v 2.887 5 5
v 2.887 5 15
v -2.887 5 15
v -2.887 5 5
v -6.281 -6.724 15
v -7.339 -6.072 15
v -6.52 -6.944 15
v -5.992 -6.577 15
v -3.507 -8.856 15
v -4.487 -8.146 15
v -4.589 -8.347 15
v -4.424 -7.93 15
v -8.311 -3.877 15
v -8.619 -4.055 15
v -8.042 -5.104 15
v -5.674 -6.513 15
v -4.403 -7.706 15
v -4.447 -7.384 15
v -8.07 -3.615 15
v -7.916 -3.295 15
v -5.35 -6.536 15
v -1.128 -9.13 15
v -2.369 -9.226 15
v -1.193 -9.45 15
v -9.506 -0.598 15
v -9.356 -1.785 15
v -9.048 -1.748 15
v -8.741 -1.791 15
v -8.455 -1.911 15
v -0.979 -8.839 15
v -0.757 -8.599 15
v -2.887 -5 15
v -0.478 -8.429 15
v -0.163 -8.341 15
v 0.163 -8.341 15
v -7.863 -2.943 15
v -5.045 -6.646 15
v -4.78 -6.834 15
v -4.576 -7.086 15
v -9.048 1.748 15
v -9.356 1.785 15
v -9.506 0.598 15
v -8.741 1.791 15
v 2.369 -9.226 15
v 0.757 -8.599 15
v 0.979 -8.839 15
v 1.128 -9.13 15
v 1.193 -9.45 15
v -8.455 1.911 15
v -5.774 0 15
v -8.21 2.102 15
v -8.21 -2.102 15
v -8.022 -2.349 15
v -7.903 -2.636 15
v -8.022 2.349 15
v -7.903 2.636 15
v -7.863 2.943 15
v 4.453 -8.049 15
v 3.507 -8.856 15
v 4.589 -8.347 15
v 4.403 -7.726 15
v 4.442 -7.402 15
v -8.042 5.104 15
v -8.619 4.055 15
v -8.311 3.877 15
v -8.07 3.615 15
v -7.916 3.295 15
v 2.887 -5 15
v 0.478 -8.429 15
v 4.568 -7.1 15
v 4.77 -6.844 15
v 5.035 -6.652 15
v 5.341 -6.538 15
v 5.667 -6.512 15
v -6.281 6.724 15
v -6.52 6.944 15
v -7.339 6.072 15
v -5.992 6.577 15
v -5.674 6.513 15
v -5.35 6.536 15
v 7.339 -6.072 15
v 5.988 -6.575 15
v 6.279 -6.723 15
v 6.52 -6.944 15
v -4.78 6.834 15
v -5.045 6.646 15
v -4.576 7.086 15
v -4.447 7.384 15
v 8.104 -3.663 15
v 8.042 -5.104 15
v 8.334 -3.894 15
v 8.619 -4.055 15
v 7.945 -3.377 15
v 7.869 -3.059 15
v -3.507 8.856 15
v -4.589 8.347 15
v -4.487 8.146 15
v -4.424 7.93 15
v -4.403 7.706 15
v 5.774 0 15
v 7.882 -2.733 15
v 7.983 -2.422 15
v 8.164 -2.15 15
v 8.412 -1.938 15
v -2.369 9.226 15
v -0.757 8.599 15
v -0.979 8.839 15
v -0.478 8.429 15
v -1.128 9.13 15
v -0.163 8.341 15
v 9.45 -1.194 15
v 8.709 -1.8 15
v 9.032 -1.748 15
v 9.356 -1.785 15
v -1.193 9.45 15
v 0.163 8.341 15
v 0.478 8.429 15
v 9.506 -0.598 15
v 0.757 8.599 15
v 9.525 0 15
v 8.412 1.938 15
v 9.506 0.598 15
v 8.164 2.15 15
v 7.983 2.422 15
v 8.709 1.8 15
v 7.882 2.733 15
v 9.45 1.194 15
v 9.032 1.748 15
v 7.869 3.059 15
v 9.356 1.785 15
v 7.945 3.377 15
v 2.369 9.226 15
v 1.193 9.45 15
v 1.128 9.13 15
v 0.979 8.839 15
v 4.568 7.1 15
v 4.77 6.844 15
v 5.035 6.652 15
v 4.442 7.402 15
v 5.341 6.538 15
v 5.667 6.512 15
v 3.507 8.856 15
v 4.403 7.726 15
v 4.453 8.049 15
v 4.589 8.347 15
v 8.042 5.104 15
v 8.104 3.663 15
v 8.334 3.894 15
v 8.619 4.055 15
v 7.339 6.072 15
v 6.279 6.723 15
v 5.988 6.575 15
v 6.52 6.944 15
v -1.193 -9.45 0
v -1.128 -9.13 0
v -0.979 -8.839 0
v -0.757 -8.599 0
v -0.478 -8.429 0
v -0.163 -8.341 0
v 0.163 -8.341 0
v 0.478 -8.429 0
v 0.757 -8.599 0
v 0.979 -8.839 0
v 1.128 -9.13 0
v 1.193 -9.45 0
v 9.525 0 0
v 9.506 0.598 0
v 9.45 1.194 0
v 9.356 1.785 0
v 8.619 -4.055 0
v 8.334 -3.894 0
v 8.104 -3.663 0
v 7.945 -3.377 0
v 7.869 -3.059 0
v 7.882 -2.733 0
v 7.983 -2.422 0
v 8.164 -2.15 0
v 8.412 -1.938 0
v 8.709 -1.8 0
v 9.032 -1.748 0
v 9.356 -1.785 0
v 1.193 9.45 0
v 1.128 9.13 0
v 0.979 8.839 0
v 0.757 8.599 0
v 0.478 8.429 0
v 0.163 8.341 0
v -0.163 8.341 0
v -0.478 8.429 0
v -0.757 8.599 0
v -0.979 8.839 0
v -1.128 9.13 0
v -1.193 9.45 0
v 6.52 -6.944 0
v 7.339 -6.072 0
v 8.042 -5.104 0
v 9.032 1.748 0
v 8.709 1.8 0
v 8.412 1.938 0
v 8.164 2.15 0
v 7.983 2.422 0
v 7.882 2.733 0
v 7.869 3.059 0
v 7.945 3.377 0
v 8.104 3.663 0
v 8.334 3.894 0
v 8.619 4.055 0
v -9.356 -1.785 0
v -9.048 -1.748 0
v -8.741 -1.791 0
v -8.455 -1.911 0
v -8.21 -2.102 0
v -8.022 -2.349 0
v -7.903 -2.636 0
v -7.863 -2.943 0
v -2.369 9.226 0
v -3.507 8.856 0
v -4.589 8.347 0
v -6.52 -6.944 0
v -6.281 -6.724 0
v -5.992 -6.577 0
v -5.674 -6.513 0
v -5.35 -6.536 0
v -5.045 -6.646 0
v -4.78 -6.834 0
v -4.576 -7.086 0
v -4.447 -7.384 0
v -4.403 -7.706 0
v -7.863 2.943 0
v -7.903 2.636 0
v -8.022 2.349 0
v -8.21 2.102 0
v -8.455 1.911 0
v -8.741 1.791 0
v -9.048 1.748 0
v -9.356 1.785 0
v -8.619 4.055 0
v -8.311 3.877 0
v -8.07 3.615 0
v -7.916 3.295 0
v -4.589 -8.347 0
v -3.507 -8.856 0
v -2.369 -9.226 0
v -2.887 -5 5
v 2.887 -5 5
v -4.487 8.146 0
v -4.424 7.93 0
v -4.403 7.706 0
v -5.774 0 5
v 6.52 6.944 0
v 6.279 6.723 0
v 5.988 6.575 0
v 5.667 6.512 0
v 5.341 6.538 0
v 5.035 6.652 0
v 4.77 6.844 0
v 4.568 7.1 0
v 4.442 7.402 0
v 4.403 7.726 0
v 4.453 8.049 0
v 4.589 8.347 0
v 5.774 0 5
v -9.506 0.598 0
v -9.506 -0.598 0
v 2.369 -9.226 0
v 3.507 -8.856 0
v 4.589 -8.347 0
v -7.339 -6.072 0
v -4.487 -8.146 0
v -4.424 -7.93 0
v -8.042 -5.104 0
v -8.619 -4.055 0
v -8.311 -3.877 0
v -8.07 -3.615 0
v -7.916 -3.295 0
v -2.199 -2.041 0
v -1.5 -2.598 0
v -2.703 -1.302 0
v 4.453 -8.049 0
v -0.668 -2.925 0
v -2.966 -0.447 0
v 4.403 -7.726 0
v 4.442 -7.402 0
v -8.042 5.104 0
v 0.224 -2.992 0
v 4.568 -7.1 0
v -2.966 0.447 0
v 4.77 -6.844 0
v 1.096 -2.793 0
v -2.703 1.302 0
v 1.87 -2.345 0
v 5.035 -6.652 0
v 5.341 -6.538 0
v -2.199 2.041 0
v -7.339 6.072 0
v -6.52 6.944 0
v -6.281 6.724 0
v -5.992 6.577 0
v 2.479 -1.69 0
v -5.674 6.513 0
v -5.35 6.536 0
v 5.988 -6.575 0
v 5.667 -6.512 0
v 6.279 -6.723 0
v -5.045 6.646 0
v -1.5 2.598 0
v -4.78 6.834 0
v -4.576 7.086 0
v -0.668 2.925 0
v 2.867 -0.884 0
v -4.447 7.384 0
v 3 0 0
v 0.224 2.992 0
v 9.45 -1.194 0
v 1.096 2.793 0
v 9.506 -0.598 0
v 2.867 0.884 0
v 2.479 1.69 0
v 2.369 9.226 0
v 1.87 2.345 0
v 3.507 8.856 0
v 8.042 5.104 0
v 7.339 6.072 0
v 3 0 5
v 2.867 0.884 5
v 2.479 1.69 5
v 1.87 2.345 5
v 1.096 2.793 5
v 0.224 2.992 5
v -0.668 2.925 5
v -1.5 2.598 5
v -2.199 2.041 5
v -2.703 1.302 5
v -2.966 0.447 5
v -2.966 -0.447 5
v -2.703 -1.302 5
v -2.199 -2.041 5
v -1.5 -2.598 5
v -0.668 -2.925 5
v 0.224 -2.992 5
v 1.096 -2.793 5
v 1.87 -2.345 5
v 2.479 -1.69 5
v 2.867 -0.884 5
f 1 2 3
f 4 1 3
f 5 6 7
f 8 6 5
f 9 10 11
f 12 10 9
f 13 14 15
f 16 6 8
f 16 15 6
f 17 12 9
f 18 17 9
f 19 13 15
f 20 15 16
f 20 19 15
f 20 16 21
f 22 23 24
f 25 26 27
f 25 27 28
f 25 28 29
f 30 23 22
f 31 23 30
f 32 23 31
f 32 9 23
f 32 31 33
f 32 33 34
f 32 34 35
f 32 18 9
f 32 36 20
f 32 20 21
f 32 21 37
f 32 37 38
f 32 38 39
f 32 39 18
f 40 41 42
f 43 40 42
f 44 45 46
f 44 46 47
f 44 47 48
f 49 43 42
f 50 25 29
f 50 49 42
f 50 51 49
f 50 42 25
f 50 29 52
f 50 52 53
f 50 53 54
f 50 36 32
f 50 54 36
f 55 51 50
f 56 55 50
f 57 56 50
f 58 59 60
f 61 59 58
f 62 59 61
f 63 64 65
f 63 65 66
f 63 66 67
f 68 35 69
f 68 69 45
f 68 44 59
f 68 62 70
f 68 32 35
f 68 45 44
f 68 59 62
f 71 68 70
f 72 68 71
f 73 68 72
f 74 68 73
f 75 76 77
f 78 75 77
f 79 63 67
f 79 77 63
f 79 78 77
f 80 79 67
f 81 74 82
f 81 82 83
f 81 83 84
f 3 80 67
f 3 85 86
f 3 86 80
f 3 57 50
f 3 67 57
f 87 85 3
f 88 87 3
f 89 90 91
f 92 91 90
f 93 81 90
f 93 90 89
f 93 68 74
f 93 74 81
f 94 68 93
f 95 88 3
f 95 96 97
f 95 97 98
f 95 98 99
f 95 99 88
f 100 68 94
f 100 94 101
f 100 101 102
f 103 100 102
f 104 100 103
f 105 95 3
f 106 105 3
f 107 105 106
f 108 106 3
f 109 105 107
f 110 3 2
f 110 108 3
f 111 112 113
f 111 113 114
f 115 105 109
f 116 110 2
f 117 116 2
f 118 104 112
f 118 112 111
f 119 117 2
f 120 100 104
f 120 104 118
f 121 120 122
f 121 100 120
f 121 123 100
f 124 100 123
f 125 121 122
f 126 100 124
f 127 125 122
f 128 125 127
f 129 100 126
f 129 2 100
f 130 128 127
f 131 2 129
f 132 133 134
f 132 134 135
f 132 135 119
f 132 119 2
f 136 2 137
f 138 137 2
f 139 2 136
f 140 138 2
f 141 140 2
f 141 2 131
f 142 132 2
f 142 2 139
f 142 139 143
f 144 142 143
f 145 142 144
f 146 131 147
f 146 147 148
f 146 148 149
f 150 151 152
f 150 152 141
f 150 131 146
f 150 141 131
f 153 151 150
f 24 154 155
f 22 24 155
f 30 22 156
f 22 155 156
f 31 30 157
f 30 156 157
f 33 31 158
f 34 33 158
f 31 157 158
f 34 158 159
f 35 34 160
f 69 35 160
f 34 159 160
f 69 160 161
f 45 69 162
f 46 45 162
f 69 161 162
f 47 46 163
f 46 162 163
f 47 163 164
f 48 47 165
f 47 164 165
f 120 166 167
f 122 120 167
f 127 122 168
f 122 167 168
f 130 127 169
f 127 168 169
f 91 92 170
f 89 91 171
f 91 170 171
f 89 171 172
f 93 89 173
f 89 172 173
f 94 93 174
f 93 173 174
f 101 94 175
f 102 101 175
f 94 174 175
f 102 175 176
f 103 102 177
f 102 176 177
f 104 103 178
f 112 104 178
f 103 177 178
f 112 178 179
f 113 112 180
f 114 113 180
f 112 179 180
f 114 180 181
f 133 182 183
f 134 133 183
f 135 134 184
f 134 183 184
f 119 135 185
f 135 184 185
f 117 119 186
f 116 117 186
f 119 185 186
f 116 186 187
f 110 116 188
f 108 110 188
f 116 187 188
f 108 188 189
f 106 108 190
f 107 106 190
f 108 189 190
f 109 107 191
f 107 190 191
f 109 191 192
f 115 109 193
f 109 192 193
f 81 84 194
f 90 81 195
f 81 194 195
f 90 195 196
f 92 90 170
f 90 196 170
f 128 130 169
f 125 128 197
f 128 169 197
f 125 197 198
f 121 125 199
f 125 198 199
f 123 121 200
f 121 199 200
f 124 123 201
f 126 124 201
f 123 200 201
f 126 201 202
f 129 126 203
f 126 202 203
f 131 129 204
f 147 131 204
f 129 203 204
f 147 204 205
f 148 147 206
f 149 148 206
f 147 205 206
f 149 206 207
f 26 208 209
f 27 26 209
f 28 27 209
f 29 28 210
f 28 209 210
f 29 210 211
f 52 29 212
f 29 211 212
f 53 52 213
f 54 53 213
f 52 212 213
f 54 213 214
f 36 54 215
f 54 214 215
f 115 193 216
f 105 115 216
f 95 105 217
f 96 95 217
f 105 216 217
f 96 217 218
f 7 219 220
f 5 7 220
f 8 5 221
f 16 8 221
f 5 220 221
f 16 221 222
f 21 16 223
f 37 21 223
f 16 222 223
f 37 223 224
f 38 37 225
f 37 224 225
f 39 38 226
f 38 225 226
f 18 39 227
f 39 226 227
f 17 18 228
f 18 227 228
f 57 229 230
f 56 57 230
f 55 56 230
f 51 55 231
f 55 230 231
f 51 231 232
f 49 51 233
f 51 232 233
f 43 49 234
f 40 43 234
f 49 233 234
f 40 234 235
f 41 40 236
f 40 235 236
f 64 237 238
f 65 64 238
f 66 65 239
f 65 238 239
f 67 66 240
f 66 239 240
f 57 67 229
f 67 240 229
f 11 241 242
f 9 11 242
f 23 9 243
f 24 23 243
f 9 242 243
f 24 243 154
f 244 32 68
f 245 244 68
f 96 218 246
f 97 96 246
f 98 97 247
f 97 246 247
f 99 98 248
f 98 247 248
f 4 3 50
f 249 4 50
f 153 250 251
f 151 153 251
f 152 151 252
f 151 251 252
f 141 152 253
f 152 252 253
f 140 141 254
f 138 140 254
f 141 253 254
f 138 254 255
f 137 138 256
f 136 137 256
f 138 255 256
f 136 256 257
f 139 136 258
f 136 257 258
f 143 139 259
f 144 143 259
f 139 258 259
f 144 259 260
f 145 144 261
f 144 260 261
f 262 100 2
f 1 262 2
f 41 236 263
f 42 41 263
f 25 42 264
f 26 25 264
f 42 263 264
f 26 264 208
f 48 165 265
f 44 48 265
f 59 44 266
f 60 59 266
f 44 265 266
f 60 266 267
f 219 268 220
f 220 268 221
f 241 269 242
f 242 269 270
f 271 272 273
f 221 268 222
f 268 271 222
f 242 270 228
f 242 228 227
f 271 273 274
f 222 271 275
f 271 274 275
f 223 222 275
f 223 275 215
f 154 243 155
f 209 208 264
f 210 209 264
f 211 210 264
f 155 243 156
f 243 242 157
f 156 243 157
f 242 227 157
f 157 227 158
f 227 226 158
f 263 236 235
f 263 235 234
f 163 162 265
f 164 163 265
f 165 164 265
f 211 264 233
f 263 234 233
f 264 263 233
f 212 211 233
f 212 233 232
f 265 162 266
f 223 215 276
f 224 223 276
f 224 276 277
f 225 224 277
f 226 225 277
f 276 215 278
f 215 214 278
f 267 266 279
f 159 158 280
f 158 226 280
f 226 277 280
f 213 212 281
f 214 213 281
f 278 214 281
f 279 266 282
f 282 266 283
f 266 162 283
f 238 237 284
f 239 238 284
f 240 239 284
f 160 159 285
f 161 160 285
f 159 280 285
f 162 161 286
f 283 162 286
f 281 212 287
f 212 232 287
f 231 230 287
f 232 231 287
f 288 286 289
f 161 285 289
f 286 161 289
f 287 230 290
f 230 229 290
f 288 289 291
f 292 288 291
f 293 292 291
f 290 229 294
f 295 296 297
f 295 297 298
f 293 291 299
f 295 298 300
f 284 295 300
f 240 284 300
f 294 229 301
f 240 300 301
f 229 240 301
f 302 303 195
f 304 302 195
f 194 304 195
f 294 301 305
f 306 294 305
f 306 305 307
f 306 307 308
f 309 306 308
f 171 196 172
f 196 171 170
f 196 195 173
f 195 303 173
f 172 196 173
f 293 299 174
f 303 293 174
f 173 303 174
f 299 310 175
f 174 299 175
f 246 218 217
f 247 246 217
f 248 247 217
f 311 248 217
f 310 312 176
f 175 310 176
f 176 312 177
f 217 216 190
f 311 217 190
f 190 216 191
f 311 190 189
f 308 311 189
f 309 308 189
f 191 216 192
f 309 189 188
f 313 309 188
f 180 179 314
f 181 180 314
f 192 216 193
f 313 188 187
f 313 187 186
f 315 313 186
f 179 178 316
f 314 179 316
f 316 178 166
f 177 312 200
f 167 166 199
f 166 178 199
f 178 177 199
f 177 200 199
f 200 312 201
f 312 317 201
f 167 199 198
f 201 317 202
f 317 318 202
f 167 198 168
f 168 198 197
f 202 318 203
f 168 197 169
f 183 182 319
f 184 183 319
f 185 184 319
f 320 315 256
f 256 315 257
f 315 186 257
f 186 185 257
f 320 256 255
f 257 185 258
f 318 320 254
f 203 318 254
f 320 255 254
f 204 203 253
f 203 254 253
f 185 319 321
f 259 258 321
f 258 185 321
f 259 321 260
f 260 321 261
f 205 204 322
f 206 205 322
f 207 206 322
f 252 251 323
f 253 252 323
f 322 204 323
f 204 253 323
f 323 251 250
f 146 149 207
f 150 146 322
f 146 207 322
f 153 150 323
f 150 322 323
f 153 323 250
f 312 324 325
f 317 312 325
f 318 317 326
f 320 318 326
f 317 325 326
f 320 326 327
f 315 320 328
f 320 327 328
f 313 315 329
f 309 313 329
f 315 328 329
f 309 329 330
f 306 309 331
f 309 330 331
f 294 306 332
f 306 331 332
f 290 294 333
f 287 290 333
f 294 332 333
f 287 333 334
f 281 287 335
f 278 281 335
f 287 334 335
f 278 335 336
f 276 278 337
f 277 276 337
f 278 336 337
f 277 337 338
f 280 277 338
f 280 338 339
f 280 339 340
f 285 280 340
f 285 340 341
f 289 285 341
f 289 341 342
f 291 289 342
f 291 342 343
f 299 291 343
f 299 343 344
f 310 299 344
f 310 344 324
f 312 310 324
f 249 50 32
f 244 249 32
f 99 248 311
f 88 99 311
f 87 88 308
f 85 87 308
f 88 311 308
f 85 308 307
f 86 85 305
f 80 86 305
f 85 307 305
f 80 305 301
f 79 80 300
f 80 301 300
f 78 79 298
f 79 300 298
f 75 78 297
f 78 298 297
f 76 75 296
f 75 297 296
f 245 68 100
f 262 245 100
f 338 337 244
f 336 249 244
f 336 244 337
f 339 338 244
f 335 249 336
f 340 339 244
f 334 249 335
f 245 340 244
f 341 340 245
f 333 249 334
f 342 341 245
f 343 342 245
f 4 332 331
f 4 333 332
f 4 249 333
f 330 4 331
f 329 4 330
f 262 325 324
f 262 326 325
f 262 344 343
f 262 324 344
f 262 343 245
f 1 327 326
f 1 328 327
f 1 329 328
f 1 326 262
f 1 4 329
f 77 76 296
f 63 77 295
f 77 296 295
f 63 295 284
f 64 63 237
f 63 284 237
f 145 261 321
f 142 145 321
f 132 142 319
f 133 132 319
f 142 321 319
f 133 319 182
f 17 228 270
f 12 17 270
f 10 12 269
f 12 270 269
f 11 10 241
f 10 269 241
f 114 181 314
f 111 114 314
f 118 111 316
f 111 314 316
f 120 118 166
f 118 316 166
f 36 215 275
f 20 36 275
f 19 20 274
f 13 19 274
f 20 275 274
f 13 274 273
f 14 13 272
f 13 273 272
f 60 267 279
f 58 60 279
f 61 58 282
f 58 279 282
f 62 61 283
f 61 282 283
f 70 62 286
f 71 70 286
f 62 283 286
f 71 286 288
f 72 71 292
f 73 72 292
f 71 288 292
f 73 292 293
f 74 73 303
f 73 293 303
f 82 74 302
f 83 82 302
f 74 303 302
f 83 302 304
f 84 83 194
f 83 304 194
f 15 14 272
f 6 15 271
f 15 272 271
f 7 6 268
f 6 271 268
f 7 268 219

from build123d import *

# Parameters (mm, degrees)
F1_DEPTH = 15
F2_R     = 3
F3_DEPTH = 15.001
F4_R     = 3
F5_DEPTH = 10


with BuildPart() as f1:
    # F0 (on Top) → F1 (new body)
    with BuildSketch(Plane.XY):
        with BuildLine():
            ThreePointArc((9.3561974046, -1.7852717232), (9.4827054494, -0.8966171761), (9.525, 0))
            ThreePointArc((9.525, 0), (9.4827054494, 0.8966171761), (9.3561974046, 1.7852717232))
            ThreePointArc((9.3561974046, 1.7852717232), (7.9216471704, 2.5738991923), (8.6186790933, 4.0551196883))
            ThreePointArc((8.6186790933, 4.0551196883), (7.7058868714, 5.5986545281), (6.5199663128, 6.9437500156))
            ThreePointArc((6.5199663128, 6.9437500156), (4.8958471982, 6.738555569), (4.5891183065, 8.3465932074))
            ThreePointArc((4.5891183065, 8.3465932074), (2.9433868714, 9.0588133177), (1.193329695, 9.4499518115))
            ThreePointArc((1.193329695, 9.4499518115), (0, 8.3293127534), (-1.193329695, 9.4499518115))
            ThreePointArc((-1.193329695, 9.4499518115), (-2.9433868714, 9.0588133177), (-4.5891183065, 8.3465932074))
            ThreePointArc((-4.5891183065, 8.3465932074), (-4.4504477573, 8.039487236), (-4.4029672815, 7.7058868714))
            ThreePointArc((-4.4029672815, 7.7058868714), (-5.1936438859, 6.5808827064), (-6.5199663128, 6.9437500156))
            ThreePointArc((-6.5199663128, 6.9437500156), (-7.7058868714, 5.5986545281), (-8.6186790933, 4.0551196883))
            ThreePointArc((-8.6186790933, 4.0551196883), (-8.0698919683, 3.6154750772), (-7.8631260711, 2.9433868714))
            ThreePointArc((-7.8631260711, 2.9433868714), (-8.3259799016, 1.9985995007), (-9.3561974046, 1.7852717232))
            ThreePointArc((-9.3561974046, 1.7852717232), (-9.525, 0), (-9.3561974046, -1.7852717232))
            ThreePointArc((-9.3561974046, -1.7852717232), (-8.3259799016, -1.9985995007), (-7.8631260711, -2.9433868714))
            ThreePointArc((-7.8631260711, -2.9433868714), (-8.0698919683, -3.6154750772), (-8.6186790933, -4.0551196883))
            ThreePointArc((-8.6186790933, -4.0551196883), (-7.7058868714, -5.5986545281), (-6.5199663128, -6.9437500156))
            ThreePointArc((-6.5199663128, -6.9437500156), (-5.1936438859, -6.5808827064), (-4.4029672815, -7.7058868714))
            ThreePointArc((-4.4029672815, -7.7058868714), (-4.4504477573, -8.039487236), (-4.5891183065, -8.3465932074))
            ThreePointArc((-4.5891183065, -8.3465932074), (-2.9433868714, -9.0588133177), (-1.193329695, -9.4499518115))
            ThreePointArc((-1.193329695, -9.4499518115), (0, -8.3293127534), (1.193329695, -9.4499518115))
            ThreePointArc((1.193329695, -9.4499518115), (2.9433868714, -9.0588133177), (4.5891183065, -8.3465932074))
            ThreePointArc((4.5891183065, -8.3465932074), (4.8958471982, -6.738555569), (6.5199663128, -6.9437500156))
            ThreePointArc((6.5199663128, -6.9437500156), (7.7058868714, -5.5986545281), (8.6186790933, -4.0551196883))
            ThreePointArc((8.6186790933, -4.0551196883), (7.9216471704, -2.5738991923), (9.3561974046, -1.7852717232))
        make_face()
    extrude(amount=F1_DEPTH)

    # F2 (on face) → F3 (cut, through all)
    with BuildSketch(Plane.XY.offset(15)):
        Circle(F2_R)
    extrude(amount=-F3_DEPTH, mode=Mode.SUBTRACT)

    # F4 (on face) → F5 (cut)
    with BuildSketch(Plane.XY.offset(15)):
        Polygon((2.8867513459, -5), (5.7735026919, 0), (2.8867513459, 5), (-2.8867513459, 5), (-5.7735026919, 0), (-2.8867513459, -5), align=None)
        Circle(F4_R, mode=Mode.SUBTRACT)
    extrude(amount=-F5_DEPTH, mode=Mode.SUBTRACT)


solid = f1.part
